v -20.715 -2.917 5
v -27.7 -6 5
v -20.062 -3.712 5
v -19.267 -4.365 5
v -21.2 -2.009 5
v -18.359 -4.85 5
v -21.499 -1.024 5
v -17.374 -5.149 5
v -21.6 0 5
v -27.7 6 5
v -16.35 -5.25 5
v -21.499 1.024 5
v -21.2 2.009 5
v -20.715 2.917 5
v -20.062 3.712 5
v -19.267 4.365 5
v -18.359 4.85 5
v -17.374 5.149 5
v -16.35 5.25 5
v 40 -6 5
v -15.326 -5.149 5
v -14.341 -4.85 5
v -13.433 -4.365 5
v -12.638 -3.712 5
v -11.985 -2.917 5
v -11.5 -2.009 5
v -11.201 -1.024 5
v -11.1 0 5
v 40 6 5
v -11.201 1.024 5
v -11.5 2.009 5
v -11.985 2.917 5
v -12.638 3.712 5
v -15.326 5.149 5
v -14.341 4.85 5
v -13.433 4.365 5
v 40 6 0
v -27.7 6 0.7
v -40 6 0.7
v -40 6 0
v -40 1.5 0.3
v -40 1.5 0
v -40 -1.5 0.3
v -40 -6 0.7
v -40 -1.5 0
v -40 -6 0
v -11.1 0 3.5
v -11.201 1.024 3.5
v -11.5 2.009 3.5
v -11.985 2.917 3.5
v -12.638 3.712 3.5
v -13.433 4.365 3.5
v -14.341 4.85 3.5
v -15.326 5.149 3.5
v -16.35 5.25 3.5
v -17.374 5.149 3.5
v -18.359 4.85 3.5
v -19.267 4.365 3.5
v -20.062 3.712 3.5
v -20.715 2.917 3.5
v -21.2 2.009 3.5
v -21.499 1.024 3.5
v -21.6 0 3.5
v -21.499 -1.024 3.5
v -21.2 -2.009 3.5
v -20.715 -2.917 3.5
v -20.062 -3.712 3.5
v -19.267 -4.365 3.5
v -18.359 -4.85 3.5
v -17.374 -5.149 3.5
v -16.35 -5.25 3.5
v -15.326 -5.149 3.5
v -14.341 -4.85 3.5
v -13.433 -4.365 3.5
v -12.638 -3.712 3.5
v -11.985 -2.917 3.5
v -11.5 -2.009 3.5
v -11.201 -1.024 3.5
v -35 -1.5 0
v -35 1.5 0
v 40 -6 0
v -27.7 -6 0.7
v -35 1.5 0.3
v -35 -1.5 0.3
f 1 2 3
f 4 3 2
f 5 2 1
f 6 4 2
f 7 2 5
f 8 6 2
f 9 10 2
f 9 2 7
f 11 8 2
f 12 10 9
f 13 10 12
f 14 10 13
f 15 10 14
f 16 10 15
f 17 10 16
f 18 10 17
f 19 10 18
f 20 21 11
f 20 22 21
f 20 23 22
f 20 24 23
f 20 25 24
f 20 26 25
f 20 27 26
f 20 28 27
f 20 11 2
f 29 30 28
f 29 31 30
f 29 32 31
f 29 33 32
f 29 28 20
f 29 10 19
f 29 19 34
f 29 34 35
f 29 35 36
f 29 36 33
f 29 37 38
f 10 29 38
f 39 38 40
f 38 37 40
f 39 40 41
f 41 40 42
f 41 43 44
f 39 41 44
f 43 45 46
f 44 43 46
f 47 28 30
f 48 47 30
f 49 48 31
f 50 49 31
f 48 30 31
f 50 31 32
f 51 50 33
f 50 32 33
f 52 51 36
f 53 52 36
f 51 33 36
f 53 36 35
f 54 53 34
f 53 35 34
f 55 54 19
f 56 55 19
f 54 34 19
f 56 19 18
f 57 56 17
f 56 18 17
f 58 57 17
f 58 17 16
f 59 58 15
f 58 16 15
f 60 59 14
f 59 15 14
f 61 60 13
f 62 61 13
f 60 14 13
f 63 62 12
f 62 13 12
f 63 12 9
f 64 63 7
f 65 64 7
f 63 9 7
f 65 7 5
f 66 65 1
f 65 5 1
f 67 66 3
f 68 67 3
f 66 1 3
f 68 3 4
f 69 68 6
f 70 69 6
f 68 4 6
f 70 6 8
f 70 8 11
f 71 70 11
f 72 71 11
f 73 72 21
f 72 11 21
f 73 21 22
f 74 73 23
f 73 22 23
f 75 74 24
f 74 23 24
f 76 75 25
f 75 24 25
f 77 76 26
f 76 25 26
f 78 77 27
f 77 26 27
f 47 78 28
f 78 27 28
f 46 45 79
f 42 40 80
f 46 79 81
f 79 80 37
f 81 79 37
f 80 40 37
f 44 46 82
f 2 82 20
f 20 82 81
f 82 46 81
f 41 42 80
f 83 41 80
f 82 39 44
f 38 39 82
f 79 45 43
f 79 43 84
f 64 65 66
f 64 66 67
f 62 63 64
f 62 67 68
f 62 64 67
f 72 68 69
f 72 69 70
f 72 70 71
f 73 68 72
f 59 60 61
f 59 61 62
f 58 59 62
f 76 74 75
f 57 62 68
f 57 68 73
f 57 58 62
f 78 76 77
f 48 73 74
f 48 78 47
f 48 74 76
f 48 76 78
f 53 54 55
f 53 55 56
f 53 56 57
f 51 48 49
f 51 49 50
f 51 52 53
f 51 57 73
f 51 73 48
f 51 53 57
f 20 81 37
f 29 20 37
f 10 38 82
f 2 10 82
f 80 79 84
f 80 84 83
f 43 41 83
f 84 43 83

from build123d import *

# Parameters (mm, degrees)
F0_W     = 12.3
F0_H     = 6
F1_DEPTH = 0.7
F3_DEPTH = 5
F4_R     = 5.25
F5_DEPTH = 1.5
F2_W     = 5
F2_H     = 3
F6_DEPTH = 0.3


with BuildPart() as f1:
    # F0 (on Top) → F1 (new body)
    with BuildSketch(Plane.XY):
        with Locations((-33.85, -3)):
            Rectangle(F0_W, F0_H)
        with Locations((-33.85, 3)):
            Rectangle(F0_W, F0_H)
    extrude(amount=F1_DEPTH)

    # F0 (on Top) → F3 (join)
    with BuildSketch(Plane.XY):
        Polygon((40, -6), (40, 6), (-27.7, 6), (-27.7, 0), (-27.7, -6), align=None)
    extrude(amount=F3_DEPTH)

    # F4 (on face) → F5 (cut)
    with BuildSketch(Plane.XY.offset(5)):
        with Locations((-16.35, 0)):
            Circle(F4_R)
    extrude(amount=-F5_DEPTH, mode=Mode.SUBTRACT)

    # F2 (on Top) → F6 (cut)
    with BuildSketch(Plane.XY):
        with Locations((-37.5, 0)):
            Rectangle(F2_W, F2_H)
    extrude(amount=F6_DEPTH, mode=Mode.SUBTRACT)


solid = f1.part
